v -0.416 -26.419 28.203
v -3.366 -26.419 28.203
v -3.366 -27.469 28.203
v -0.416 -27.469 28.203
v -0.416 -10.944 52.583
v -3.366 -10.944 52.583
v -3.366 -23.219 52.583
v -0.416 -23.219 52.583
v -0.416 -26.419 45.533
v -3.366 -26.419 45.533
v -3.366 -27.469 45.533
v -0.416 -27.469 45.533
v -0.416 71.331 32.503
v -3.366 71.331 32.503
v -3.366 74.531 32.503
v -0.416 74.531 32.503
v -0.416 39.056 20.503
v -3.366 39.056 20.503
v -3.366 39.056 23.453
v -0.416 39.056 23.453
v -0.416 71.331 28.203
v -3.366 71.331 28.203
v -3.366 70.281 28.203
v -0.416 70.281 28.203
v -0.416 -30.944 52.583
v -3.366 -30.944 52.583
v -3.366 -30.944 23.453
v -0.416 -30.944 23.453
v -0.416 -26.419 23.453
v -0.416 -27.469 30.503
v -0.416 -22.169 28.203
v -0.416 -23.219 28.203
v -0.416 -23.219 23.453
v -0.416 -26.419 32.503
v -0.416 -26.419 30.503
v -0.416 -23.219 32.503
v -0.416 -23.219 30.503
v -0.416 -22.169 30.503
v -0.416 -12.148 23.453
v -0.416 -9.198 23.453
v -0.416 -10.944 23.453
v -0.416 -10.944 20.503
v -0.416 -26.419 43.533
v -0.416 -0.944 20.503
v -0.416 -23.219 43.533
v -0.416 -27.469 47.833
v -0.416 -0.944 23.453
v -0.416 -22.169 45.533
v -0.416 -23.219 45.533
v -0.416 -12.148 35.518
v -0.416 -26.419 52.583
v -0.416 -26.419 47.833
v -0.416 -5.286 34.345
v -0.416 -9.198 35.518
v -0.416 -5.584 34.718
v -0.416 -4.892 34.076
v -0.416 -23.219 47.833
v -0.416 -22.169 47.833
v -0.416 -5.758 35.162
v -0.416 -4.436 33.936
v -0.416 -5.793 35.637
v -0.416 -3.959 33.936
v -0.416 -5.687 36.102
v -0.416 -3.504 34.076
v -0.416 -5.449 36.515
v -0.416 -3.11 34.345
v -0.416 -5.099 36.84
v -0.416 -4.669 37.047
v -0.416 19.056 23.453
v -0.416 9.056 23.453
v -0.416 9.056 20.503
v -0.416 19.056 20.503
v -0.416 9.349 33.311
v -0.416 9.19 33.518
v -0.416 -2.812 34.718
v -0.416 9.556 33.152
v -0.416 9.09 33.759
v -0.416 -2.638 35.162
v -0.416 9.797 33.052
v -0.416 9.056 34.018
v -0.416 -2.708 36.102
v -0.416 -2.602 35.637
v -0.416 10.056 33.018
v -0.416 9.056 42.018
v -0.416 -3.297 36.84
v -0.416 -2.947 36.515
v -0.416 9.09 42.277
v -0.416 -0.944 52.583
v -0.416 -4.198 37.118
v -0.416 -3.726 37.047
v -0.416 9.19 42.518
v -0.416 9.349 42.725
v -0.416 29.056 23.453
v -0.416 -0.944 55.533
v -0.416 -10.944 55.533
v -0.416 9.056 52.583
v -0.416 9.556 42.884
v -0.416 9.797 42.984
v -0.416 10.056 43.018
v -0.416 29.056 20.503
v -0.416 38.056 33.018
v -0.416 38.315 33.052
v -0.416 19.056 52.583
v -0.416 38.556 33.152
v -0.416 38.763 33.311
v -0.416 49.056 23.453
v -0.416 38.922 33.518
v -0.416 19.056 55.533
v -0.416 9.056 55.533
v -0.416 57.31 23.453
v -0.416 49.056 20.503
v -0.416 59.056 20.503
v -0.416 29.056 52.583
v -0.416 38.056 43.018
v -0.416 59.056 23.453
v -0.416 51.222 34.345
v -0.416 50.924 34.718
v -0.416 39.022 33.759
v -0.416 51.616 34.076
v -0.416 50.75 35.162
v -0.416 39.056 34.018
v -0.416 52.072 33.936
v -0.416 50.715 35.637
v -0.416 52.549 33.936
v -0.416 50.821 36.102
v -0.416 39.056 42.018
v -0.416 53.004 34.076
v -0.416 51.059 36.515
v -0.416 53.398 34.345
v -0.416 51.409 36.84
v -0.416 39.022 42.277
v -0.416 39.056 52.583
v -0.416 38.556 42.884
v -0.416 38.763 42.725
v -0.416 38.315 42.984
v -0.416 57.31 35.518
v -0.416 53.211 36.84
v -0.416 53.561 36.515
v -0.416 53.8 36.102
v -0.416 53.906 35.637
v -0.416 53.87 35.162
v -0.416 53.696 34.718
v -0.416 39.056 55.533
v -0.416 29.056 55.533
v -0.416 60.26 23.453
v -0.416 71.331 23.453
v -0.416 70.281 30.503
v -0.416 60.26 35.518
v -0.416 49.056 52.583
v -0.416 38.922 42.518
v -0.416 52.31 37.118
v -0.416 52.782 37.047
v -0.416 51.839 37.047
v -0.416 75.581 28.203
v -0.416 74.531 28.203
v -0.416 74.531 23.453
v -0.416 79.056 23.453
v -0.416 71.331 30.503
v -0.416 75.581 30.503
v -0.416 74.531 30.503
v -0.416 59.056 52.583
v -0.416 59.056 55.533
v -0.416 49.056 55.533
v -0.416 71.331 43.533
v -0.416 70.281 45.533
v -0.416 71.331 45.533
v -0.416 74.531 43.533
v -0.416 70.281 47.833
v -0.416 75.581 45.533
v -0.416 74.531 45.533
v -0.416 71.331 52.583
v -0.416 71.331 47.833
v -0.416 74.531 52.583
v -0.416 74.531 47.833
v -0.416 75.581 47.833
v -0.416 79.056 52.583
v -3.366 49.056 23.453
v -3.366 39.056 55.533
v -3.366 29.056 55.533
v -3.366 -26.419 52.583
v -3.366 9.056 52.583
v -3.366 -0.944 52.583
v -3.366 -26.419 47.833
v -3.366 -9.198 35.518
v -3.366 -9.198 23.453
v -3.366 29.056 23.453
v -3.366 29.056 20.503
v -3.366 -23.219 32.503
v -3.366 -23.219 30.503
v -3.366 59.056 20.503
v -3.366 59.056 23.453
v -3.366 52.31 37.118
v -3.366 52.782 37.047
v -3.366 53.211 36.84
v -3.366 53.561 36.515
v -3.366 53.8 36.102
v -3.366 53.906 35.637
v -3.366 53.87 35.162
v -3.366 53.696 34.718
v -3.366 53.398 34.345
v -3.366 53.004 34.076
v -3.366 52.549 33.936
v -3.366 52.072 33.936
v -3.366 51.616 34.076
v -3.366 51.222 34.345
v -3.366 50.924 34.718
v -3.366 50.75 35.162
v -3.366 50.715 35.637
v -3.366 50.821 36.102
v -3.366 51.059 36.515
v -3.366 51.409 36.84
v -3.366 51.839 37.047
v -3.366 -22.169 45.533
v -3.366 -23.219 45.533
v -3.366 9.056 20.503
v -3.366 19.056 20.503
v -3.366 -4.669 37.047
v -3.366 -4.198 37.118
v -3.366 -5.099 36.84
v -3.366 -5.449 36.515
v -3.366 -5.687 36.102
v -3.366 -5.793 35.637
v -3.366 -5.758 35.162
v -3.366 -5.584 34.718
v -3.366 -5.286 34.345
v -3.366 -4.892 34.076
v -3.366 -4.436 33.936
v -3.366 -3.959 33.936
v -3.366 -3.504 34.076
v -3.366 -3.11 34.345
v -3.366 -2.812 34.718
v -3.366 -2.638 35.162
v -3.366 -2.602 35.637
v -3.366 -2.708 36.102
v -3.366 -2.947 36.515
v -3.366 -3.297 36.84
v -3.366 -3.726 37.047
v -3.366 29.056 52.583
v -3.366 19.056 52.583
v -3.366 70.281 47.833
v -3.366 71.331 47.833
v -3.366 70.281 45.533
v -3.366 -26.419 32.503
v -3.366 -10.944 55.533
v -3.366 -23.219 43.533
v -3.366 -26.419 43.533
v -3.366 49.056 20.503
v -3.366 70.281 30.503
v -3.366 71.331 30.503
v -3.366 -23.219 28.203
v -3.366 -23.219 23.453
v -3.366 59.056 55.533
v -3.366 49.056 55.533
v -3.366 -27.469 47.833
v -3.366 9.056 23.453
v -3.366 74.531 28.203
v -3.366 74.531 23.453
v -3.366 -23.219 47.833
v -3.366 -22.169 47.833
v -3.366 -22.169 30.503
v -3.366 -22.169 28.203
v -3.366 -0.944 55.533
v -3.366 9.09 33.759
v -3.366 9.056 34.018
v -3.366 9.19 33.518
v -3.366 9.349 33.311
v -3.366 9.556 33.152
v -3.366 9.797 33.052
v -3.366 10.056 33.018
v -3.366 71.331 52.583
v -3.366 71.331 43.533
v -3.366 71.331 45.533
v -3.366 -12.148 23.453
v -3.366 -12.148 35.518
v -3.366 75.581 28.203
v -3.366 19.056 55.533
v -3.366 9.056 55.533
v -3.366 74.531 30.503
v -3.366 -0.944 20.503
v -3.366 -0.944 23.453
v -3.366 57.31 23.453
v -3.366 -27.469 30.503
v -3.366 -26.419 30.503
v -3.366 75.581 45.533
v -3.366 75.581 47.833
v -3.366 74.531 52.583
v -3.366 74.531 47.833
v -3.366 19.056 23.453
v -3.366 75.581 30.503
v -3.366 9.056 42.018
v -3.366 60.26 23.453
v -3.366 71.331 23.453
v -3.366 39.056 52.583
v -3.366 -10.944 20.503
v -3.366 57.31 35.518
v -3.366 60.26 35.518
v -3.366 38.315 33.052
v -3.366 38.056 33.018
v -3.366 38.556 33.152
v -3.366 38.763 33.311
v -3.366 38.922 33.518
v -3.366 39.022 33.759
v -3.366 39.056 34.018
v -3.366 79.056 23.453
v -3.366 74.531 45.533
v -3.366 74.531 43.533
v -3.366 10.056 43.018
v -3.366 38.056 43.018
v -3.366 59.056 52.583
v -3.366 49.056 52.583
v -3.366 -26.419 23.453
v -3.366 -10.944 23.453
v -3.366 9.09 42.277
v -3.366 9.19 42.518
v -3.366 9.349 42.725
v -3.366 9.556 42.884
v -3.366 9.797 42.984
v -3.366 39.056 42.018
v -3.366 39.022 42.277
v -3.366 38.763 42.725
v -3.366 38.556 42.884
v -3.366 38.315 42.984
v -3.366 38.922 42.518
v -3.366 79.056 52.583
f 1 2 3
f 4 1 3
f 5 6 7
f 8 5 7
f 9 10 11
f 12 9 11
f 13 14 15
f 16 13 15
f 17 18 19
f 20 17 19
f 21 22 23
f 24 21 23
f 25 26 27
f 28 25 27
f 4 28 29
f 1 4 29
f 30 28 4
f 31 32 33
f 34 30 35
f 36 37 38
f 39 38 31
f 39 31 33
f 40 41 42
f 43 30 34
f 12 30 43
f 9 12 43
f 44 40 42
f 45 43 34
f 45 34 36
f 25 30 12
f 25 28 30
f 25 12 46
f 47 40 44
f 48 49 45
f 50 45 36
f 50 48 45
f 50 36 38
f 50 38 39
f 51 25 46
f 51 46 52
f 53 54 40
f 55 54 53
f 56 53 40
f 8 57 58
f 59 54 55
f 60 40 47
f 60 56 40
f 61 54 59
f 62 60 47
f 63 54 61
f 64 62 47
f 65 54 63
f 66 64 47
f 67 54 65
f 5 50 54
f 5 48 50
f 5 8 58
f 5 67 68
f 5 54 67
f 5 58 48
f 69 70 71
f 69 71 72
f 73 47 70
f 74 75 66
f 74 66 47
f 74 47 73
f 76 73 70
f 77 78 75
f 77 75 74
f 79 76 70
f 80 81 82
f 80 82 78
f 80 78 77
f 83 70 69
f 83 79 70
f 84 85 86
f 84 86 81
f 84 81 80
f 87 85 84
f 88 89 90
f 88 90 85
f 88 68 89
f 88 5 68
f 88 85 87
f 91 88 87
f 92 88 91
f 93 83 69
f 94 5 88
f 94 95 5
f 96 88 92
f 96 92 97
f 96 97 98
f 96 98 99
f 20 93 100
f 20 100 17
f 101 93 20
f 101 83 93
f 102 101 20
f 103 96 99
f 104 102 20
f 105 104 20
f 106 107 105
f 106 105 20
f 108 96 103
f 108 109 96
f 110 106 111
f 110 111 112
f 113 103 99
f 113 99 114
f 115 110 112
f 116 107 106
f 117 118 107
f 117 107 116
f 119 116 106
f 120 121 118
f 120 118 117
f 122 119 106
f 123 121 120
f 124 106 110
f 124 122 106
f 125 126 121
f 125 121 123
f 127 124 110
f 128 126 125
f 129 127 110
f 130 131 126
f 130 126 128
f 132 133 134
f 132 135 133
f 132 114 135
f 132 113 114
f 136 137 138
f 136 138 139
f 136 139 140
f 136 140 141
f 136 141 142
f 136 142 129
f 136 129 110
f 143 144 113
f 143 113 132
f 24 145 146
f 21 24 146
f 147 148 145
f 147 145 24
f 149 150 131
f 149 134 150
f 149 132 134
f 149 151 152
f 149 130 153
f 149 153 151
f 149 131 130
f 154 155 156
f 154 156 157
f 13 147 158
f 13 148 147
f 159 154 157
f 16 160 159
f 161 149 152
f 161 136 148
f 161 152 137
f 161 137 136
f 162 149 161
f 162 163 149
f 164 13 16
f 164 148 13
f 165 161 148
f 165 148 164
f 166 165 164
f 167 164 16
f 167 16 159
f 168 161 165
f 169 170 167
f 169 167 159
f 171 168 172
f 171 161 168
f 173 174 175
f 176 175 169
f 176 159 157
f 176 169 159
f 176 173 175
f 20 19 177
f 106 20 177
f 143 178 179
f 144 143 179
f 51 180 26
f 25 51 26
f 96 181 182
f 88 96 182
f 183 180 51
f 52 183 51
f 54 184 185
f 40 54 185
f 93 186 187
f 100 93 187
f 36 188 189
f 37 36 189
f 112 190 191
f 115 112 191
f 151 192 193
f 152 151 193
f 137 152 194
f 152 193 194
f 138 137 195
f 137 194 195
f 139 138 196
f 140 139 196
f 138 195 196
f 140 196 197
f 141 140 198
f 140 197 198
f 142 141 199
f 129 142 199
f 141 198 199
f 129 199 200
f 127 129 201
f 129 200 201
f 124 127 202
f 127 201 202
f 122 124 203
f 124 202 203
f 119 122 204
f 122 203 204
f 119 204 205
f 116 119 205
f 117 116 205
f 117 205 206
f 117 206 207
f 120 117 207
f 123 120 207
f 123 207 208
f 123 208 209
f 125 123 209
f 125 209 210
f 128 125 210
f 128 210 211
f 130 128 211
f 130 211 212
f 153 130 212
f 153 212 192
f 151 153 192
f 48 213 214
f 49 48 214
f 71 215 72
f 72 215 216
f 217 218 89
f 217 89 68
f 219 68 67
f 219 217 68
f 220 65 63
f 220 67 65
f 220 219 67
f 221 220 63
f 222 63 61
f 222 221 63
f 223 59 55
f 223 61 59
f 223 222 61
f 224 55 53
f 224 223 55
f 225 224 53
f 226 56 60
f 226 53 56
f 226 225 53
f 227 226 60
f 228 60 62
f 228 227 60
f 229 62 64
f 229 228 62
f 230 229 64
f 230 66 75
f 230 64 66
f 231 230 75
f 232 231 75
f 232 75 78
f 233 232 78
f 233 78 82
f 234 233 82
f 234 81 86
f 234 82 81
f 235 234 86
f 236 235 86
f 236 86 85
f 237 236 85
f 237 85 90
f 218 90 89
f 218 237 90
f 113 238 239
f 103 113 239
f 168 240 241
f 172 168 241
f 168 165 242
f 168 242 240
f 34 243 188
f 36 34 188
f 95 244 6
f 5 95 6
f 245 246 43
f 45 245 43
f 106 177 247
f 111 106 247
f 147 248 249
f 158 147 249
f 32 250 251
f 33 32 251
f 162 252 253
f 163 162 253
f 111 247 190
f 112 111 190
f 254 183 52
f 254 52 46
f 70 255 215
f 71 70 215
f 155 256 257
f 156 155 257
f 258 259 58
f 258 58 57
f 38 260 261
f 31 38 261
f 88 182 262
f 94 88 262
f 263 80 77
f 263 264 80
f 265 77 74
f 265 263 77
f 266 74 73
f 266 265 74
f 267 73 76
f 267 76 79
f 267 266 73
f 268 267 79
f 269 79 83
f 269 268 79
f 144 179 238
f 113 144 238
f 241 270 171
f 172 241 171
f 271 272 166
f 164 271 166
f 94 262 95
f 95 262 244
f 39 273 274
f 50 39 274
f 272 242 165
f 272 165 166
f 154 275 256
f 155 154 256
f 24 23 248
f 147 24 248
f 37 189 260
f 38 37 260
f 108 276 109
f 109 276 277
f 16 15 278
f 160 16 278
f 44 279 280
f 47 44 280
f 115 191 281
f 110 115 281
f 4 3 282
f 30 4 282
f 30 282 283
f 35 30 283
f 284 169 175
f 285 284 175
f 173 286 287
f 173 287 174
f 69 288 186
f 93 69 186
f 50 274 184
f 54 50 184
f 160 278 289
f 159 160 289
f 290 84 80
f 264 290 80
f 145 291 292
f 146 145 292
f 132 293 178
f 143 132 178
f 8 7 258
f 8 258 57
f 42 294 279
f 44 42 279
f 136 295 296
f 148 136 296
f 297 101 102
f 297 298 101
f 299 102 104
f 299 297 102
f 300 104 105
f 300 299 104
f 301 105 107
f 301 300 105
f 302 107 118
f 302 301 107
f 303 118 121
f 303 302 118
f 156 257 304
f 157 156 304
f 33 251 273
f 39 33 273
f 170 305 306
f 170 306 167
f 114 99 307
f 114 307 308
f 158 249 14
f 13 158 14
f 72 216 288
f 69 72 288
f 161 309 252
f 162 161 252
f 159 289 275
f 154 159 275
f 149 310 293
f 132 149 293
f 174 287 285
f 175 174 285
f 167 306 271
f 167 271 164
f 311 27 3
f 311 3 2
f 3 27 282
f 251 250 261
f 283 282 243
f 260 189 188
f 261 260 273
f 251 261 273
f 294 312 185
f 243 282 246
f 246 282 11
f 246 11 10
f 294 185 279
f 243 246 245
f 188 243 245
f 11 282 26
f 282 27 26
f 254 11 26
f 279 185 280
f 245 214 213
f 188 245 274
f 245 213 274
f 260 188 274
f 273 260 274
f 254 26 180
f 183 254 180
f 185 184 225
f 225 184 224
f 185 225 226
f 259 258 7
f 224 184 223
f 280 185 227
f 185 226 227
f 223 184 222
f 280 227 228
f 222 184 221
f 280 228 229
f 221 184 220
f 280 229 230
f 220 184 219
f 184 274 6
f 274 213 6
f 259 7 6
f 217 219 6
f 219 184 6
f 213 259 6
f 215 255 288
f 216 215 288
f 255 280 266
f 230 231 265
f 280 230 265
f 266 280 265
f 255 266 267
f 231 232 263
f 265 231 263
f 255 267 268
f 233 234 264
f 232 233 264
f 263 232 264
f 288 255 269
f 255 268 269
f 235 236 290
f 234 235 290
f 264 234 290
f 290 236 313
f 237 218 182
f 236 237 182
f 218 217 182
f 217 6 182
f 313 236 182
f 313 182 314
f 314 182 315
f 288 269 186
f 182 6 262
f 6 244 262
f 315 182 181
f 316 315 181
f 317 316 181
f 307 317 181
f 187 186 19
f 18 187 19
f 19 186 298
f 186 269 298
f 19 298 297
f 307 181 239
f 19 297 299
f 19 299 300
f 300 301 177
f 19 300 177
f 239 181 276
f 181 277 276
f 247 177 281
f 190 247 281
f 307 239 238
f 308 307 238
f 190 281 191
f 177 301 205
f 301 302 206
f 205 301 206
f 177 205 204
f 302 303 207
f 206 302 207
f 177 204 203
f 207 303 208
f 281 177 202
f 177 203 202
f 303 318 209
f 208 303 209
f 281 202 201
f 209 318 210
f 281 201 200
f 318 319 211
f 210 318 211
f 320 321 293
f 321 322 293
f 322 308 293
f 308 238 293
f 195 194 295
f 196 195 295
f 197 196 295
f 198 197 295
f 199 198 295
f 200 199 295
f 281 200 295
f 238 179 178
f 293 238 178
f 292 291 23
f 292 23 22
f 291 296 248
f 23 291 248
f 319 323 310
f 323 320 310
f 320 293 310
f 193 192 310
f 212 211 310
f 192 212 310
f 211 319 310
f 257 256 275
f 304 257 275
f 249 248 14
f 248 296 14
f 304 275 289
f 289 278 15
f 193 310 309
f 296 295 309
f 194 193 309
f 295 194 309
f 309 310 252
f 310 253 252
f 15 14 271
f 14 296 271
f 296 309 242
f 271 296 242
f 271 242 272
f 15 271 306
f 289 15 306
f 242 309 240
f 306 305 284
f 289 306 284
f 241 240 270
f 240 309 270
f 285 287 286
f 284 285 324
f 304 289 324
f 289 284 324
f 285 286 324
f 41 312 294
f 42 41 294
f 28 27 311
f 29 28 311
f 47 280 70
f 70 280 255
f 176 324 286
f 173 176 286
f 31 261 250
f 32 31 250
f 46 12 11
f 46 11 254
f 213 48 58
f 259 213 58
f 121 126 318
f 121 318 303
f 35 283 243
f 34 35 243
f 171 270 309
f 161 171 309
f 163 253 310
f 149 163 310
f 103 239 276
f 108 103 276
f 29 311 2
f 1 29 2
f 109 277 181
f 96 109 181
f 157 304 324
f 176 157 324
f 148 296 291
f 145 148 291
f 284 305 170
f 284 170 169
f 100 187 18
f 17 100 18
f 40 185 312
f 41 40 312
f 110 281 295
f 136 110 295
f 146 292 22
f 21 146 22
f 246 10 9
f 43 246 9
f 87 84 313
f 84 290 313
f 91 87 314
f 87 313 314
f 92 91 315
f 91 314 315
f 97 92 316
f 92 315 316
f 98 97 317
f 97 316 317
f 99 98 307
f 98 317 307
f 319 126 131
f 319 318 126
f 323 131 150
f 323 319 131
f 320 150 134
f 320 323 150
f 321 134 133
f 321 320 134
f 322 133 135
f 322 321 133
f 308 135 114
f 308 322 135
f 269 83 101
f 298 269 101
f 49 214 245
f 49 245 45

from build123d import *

# Parameters (mm, degrees)
FRONT_START          = -3.366352234
FRONT_PLATE_DEPTH    = 2.95
CUT_EXTRUDE1_START   = 2.95
SKETCH1_W            = 3.2
SKETCH1_H            = 3.2
CUT_EXTRUDE1_DEPTH   = 12
SKETCH2_W            = 2.3
SKETCH2_H            = 5.3
CUT_EXTRUDE2_DEPTH   = 97.656428996
M3_CLEARANCE_HOLE1_D = 3.2
SKETCH5_W            = 10
SKETCH5_H            = 30
CUT_EXTRUDE3_DEPTH   = 97.656428996
FILLET1_R            = 1


# Read off the part's stored shape, not the designer's step: Front Plate
with BuildPart() as part:
    # Front Plate outline → Front Plate (new body)
    with BuildSketch(Plane.YZ.offset(FRONT_START)):
        Polygon((-23.21888173, 23.452809495), (-12.14788173, 23.452809495), (-12.14788173, 35.517809495), (-9.19788173, 35.517809495), (-9.19788173, 23.452809495), (-10.94388173, 23.452809495), (-10.94388173, 20.502809495), (-0.94388173, 20.502809495), (-0.94388173, 23.452809495), (9.05611827, 23.452809495), (9.05611827, 20.502809495), (19.05611827, 20.502809495), (19.05611827, 23.452809495), (29.05611827, 23.452809495), (29.05611827, 20.502809495), (39.05611827, 20.502809495), (39.05611827, 23.452809495), (49.05611827, 23.452809495), (49.05611827, 20.502809495), (59.05611827, 20.502809495), (59.05611827, 23.452809495), (57.31011827, 23.452809495), (57.31011827, 35.517809495), (60.26011827, 35.517809495), (60.26011827, 23.452809495), (71.33111827, 23.452809495), (71.33111827, 28.202809495), (70.28111827, 28.202809495), (70.28111827, 30.502809495), (71.33111827, 30.502809495), (71.33111827, 32.502809495), (74.53111827, 32.502809495), (74.53111827, 30.502809495), (75.58111827, 30.502809495), (75.58111827, 28.202809495), (74.53111827, 28.202809495), (74.53111827, 23.452809495), (79.05611827, 23.452809495), (79.05611827, 52.582809495), (59.05611827, 52.582809495), (59.05611827, 55.532809495), (49.05611827, 55.532809495), (49.05611827, 52.582809495), (39.05611827, 52.582809495), (39.05611827, 55.532809495), (29.05611827, 55.532809495), (29.05611827, 52.582809495), (19.05611827, 52.582809495), (19.05611827, 55.532809495), (9.05611827, 55.532809495), (9.05611827, 52.582809495), (-0.94388173, 52.582809495), (-0.94388173, 55.532809495), (-10.94388173, 55.532809495), (-10.94388173, 52.582809495), (-30.94388173, 52.582809495), (-30.94388173, 23.452809495), (-26.41888173, 23.452809495), (-26.41888173, 28.202809495), (-27.46888173, 28.202809495), (-27.46888173, 30.502809495), (-26.41888173, 30.502809495), (-26.41888173, 32.502809495), (-23.21888173, 32.502809495), (-23.21888173, 30.502809495), (-22.16888173, 30.502809495), (-22.16888173, 28.202809495), (-23.21888173, 28.202809495), align=None)
    extrude(amount=FRONT_PLATE_DEPTH)

    # Sketch1 → Cut-Extrude1 (cut)
    with BuildSketch(Plane.XY.offset(52.582809495).offset(CUT_EXTRUDE1_START)):
        with Locations((-1.891352234, 72.93111827)):
            Rectangle(SKETCH1_W, SKETCH1_H)
    cut_extrude1 = extrude(amount=-CUT_EXTRUDE1_DEPTH, mode=Mode.SUBTRACT)

    # Sketch2 → Cut-Extrude2 (cut, through all)
    with BuildSketch(Plane.ZY.offset(3.366352234)):
        with Locations((46.682809496, 72.93111827)):
            Rectangle(SKETCH2_W, SKETCH2_H)
    cut_extrude2 = extrude(amount=-CUT_EXTRUDE2_DEPTH, mode=Mode.SUBTRACT)

    # M3 Clearance Hole1 (through all)
    with Locations(Plane(origin=(-0.416352234, 0, 0), x_dir=(0, 0, -1), z_dir=(1, 0, 0))):
        with Locations((-35.517809495, 52.31011827)):
            m3_clearance_hole1 = Hole(M3_CLEARANCE_HOLE1_D / 2)

    # Mirror1: Cut-Extrude1, Cut-Extrude2, M3 Clearance Hole1 across plane
    add(cut_extrude1.mirror(Plane.ZX.offset(24.05611827)), mode=Mode.SUBTRACT)
    add(cut_extrude2.mirror(Plane.ZX.offset(24.05611827)), mode=Mode.SUBTRACT)
    add(m3_clearance_hole1.mirror(Plane.ZX.offset(24.05611827)), mode=Mode.SUBTRACT)

    # Sketch5 → Cut-Extrude3 (cut, through all)
    with BuildSketch(Plane(origin=(-0.416352234, 0, 0), x_dir=(0, 0, -1), z_dir=(1, 0, 0))):
        with Locations((-38.017809495, 24.05611827)):
            Rectangle(SKETCH5_W, SKETCH5_H)
    extrude(amount=-CUT_EXTRUDE3_DEPTH, mode=Mode.SUBTRACT)

    # Fillet1
    fillet1_edges = [part.edges().sort_by_distance(p)[0] for p in [
        (-1.891352234, 39.05611827, 33.017809495),
        (-1.891352234, 9.05611827, 33.017809495),
        (-1.891352234, 9.05611827, 43.017809495),
        (-1.891352234, 39.05611827, 43.017809495),
    ]]
    fillet(fillet1_edges, radius=FILLET1_R)


solid = part.part
